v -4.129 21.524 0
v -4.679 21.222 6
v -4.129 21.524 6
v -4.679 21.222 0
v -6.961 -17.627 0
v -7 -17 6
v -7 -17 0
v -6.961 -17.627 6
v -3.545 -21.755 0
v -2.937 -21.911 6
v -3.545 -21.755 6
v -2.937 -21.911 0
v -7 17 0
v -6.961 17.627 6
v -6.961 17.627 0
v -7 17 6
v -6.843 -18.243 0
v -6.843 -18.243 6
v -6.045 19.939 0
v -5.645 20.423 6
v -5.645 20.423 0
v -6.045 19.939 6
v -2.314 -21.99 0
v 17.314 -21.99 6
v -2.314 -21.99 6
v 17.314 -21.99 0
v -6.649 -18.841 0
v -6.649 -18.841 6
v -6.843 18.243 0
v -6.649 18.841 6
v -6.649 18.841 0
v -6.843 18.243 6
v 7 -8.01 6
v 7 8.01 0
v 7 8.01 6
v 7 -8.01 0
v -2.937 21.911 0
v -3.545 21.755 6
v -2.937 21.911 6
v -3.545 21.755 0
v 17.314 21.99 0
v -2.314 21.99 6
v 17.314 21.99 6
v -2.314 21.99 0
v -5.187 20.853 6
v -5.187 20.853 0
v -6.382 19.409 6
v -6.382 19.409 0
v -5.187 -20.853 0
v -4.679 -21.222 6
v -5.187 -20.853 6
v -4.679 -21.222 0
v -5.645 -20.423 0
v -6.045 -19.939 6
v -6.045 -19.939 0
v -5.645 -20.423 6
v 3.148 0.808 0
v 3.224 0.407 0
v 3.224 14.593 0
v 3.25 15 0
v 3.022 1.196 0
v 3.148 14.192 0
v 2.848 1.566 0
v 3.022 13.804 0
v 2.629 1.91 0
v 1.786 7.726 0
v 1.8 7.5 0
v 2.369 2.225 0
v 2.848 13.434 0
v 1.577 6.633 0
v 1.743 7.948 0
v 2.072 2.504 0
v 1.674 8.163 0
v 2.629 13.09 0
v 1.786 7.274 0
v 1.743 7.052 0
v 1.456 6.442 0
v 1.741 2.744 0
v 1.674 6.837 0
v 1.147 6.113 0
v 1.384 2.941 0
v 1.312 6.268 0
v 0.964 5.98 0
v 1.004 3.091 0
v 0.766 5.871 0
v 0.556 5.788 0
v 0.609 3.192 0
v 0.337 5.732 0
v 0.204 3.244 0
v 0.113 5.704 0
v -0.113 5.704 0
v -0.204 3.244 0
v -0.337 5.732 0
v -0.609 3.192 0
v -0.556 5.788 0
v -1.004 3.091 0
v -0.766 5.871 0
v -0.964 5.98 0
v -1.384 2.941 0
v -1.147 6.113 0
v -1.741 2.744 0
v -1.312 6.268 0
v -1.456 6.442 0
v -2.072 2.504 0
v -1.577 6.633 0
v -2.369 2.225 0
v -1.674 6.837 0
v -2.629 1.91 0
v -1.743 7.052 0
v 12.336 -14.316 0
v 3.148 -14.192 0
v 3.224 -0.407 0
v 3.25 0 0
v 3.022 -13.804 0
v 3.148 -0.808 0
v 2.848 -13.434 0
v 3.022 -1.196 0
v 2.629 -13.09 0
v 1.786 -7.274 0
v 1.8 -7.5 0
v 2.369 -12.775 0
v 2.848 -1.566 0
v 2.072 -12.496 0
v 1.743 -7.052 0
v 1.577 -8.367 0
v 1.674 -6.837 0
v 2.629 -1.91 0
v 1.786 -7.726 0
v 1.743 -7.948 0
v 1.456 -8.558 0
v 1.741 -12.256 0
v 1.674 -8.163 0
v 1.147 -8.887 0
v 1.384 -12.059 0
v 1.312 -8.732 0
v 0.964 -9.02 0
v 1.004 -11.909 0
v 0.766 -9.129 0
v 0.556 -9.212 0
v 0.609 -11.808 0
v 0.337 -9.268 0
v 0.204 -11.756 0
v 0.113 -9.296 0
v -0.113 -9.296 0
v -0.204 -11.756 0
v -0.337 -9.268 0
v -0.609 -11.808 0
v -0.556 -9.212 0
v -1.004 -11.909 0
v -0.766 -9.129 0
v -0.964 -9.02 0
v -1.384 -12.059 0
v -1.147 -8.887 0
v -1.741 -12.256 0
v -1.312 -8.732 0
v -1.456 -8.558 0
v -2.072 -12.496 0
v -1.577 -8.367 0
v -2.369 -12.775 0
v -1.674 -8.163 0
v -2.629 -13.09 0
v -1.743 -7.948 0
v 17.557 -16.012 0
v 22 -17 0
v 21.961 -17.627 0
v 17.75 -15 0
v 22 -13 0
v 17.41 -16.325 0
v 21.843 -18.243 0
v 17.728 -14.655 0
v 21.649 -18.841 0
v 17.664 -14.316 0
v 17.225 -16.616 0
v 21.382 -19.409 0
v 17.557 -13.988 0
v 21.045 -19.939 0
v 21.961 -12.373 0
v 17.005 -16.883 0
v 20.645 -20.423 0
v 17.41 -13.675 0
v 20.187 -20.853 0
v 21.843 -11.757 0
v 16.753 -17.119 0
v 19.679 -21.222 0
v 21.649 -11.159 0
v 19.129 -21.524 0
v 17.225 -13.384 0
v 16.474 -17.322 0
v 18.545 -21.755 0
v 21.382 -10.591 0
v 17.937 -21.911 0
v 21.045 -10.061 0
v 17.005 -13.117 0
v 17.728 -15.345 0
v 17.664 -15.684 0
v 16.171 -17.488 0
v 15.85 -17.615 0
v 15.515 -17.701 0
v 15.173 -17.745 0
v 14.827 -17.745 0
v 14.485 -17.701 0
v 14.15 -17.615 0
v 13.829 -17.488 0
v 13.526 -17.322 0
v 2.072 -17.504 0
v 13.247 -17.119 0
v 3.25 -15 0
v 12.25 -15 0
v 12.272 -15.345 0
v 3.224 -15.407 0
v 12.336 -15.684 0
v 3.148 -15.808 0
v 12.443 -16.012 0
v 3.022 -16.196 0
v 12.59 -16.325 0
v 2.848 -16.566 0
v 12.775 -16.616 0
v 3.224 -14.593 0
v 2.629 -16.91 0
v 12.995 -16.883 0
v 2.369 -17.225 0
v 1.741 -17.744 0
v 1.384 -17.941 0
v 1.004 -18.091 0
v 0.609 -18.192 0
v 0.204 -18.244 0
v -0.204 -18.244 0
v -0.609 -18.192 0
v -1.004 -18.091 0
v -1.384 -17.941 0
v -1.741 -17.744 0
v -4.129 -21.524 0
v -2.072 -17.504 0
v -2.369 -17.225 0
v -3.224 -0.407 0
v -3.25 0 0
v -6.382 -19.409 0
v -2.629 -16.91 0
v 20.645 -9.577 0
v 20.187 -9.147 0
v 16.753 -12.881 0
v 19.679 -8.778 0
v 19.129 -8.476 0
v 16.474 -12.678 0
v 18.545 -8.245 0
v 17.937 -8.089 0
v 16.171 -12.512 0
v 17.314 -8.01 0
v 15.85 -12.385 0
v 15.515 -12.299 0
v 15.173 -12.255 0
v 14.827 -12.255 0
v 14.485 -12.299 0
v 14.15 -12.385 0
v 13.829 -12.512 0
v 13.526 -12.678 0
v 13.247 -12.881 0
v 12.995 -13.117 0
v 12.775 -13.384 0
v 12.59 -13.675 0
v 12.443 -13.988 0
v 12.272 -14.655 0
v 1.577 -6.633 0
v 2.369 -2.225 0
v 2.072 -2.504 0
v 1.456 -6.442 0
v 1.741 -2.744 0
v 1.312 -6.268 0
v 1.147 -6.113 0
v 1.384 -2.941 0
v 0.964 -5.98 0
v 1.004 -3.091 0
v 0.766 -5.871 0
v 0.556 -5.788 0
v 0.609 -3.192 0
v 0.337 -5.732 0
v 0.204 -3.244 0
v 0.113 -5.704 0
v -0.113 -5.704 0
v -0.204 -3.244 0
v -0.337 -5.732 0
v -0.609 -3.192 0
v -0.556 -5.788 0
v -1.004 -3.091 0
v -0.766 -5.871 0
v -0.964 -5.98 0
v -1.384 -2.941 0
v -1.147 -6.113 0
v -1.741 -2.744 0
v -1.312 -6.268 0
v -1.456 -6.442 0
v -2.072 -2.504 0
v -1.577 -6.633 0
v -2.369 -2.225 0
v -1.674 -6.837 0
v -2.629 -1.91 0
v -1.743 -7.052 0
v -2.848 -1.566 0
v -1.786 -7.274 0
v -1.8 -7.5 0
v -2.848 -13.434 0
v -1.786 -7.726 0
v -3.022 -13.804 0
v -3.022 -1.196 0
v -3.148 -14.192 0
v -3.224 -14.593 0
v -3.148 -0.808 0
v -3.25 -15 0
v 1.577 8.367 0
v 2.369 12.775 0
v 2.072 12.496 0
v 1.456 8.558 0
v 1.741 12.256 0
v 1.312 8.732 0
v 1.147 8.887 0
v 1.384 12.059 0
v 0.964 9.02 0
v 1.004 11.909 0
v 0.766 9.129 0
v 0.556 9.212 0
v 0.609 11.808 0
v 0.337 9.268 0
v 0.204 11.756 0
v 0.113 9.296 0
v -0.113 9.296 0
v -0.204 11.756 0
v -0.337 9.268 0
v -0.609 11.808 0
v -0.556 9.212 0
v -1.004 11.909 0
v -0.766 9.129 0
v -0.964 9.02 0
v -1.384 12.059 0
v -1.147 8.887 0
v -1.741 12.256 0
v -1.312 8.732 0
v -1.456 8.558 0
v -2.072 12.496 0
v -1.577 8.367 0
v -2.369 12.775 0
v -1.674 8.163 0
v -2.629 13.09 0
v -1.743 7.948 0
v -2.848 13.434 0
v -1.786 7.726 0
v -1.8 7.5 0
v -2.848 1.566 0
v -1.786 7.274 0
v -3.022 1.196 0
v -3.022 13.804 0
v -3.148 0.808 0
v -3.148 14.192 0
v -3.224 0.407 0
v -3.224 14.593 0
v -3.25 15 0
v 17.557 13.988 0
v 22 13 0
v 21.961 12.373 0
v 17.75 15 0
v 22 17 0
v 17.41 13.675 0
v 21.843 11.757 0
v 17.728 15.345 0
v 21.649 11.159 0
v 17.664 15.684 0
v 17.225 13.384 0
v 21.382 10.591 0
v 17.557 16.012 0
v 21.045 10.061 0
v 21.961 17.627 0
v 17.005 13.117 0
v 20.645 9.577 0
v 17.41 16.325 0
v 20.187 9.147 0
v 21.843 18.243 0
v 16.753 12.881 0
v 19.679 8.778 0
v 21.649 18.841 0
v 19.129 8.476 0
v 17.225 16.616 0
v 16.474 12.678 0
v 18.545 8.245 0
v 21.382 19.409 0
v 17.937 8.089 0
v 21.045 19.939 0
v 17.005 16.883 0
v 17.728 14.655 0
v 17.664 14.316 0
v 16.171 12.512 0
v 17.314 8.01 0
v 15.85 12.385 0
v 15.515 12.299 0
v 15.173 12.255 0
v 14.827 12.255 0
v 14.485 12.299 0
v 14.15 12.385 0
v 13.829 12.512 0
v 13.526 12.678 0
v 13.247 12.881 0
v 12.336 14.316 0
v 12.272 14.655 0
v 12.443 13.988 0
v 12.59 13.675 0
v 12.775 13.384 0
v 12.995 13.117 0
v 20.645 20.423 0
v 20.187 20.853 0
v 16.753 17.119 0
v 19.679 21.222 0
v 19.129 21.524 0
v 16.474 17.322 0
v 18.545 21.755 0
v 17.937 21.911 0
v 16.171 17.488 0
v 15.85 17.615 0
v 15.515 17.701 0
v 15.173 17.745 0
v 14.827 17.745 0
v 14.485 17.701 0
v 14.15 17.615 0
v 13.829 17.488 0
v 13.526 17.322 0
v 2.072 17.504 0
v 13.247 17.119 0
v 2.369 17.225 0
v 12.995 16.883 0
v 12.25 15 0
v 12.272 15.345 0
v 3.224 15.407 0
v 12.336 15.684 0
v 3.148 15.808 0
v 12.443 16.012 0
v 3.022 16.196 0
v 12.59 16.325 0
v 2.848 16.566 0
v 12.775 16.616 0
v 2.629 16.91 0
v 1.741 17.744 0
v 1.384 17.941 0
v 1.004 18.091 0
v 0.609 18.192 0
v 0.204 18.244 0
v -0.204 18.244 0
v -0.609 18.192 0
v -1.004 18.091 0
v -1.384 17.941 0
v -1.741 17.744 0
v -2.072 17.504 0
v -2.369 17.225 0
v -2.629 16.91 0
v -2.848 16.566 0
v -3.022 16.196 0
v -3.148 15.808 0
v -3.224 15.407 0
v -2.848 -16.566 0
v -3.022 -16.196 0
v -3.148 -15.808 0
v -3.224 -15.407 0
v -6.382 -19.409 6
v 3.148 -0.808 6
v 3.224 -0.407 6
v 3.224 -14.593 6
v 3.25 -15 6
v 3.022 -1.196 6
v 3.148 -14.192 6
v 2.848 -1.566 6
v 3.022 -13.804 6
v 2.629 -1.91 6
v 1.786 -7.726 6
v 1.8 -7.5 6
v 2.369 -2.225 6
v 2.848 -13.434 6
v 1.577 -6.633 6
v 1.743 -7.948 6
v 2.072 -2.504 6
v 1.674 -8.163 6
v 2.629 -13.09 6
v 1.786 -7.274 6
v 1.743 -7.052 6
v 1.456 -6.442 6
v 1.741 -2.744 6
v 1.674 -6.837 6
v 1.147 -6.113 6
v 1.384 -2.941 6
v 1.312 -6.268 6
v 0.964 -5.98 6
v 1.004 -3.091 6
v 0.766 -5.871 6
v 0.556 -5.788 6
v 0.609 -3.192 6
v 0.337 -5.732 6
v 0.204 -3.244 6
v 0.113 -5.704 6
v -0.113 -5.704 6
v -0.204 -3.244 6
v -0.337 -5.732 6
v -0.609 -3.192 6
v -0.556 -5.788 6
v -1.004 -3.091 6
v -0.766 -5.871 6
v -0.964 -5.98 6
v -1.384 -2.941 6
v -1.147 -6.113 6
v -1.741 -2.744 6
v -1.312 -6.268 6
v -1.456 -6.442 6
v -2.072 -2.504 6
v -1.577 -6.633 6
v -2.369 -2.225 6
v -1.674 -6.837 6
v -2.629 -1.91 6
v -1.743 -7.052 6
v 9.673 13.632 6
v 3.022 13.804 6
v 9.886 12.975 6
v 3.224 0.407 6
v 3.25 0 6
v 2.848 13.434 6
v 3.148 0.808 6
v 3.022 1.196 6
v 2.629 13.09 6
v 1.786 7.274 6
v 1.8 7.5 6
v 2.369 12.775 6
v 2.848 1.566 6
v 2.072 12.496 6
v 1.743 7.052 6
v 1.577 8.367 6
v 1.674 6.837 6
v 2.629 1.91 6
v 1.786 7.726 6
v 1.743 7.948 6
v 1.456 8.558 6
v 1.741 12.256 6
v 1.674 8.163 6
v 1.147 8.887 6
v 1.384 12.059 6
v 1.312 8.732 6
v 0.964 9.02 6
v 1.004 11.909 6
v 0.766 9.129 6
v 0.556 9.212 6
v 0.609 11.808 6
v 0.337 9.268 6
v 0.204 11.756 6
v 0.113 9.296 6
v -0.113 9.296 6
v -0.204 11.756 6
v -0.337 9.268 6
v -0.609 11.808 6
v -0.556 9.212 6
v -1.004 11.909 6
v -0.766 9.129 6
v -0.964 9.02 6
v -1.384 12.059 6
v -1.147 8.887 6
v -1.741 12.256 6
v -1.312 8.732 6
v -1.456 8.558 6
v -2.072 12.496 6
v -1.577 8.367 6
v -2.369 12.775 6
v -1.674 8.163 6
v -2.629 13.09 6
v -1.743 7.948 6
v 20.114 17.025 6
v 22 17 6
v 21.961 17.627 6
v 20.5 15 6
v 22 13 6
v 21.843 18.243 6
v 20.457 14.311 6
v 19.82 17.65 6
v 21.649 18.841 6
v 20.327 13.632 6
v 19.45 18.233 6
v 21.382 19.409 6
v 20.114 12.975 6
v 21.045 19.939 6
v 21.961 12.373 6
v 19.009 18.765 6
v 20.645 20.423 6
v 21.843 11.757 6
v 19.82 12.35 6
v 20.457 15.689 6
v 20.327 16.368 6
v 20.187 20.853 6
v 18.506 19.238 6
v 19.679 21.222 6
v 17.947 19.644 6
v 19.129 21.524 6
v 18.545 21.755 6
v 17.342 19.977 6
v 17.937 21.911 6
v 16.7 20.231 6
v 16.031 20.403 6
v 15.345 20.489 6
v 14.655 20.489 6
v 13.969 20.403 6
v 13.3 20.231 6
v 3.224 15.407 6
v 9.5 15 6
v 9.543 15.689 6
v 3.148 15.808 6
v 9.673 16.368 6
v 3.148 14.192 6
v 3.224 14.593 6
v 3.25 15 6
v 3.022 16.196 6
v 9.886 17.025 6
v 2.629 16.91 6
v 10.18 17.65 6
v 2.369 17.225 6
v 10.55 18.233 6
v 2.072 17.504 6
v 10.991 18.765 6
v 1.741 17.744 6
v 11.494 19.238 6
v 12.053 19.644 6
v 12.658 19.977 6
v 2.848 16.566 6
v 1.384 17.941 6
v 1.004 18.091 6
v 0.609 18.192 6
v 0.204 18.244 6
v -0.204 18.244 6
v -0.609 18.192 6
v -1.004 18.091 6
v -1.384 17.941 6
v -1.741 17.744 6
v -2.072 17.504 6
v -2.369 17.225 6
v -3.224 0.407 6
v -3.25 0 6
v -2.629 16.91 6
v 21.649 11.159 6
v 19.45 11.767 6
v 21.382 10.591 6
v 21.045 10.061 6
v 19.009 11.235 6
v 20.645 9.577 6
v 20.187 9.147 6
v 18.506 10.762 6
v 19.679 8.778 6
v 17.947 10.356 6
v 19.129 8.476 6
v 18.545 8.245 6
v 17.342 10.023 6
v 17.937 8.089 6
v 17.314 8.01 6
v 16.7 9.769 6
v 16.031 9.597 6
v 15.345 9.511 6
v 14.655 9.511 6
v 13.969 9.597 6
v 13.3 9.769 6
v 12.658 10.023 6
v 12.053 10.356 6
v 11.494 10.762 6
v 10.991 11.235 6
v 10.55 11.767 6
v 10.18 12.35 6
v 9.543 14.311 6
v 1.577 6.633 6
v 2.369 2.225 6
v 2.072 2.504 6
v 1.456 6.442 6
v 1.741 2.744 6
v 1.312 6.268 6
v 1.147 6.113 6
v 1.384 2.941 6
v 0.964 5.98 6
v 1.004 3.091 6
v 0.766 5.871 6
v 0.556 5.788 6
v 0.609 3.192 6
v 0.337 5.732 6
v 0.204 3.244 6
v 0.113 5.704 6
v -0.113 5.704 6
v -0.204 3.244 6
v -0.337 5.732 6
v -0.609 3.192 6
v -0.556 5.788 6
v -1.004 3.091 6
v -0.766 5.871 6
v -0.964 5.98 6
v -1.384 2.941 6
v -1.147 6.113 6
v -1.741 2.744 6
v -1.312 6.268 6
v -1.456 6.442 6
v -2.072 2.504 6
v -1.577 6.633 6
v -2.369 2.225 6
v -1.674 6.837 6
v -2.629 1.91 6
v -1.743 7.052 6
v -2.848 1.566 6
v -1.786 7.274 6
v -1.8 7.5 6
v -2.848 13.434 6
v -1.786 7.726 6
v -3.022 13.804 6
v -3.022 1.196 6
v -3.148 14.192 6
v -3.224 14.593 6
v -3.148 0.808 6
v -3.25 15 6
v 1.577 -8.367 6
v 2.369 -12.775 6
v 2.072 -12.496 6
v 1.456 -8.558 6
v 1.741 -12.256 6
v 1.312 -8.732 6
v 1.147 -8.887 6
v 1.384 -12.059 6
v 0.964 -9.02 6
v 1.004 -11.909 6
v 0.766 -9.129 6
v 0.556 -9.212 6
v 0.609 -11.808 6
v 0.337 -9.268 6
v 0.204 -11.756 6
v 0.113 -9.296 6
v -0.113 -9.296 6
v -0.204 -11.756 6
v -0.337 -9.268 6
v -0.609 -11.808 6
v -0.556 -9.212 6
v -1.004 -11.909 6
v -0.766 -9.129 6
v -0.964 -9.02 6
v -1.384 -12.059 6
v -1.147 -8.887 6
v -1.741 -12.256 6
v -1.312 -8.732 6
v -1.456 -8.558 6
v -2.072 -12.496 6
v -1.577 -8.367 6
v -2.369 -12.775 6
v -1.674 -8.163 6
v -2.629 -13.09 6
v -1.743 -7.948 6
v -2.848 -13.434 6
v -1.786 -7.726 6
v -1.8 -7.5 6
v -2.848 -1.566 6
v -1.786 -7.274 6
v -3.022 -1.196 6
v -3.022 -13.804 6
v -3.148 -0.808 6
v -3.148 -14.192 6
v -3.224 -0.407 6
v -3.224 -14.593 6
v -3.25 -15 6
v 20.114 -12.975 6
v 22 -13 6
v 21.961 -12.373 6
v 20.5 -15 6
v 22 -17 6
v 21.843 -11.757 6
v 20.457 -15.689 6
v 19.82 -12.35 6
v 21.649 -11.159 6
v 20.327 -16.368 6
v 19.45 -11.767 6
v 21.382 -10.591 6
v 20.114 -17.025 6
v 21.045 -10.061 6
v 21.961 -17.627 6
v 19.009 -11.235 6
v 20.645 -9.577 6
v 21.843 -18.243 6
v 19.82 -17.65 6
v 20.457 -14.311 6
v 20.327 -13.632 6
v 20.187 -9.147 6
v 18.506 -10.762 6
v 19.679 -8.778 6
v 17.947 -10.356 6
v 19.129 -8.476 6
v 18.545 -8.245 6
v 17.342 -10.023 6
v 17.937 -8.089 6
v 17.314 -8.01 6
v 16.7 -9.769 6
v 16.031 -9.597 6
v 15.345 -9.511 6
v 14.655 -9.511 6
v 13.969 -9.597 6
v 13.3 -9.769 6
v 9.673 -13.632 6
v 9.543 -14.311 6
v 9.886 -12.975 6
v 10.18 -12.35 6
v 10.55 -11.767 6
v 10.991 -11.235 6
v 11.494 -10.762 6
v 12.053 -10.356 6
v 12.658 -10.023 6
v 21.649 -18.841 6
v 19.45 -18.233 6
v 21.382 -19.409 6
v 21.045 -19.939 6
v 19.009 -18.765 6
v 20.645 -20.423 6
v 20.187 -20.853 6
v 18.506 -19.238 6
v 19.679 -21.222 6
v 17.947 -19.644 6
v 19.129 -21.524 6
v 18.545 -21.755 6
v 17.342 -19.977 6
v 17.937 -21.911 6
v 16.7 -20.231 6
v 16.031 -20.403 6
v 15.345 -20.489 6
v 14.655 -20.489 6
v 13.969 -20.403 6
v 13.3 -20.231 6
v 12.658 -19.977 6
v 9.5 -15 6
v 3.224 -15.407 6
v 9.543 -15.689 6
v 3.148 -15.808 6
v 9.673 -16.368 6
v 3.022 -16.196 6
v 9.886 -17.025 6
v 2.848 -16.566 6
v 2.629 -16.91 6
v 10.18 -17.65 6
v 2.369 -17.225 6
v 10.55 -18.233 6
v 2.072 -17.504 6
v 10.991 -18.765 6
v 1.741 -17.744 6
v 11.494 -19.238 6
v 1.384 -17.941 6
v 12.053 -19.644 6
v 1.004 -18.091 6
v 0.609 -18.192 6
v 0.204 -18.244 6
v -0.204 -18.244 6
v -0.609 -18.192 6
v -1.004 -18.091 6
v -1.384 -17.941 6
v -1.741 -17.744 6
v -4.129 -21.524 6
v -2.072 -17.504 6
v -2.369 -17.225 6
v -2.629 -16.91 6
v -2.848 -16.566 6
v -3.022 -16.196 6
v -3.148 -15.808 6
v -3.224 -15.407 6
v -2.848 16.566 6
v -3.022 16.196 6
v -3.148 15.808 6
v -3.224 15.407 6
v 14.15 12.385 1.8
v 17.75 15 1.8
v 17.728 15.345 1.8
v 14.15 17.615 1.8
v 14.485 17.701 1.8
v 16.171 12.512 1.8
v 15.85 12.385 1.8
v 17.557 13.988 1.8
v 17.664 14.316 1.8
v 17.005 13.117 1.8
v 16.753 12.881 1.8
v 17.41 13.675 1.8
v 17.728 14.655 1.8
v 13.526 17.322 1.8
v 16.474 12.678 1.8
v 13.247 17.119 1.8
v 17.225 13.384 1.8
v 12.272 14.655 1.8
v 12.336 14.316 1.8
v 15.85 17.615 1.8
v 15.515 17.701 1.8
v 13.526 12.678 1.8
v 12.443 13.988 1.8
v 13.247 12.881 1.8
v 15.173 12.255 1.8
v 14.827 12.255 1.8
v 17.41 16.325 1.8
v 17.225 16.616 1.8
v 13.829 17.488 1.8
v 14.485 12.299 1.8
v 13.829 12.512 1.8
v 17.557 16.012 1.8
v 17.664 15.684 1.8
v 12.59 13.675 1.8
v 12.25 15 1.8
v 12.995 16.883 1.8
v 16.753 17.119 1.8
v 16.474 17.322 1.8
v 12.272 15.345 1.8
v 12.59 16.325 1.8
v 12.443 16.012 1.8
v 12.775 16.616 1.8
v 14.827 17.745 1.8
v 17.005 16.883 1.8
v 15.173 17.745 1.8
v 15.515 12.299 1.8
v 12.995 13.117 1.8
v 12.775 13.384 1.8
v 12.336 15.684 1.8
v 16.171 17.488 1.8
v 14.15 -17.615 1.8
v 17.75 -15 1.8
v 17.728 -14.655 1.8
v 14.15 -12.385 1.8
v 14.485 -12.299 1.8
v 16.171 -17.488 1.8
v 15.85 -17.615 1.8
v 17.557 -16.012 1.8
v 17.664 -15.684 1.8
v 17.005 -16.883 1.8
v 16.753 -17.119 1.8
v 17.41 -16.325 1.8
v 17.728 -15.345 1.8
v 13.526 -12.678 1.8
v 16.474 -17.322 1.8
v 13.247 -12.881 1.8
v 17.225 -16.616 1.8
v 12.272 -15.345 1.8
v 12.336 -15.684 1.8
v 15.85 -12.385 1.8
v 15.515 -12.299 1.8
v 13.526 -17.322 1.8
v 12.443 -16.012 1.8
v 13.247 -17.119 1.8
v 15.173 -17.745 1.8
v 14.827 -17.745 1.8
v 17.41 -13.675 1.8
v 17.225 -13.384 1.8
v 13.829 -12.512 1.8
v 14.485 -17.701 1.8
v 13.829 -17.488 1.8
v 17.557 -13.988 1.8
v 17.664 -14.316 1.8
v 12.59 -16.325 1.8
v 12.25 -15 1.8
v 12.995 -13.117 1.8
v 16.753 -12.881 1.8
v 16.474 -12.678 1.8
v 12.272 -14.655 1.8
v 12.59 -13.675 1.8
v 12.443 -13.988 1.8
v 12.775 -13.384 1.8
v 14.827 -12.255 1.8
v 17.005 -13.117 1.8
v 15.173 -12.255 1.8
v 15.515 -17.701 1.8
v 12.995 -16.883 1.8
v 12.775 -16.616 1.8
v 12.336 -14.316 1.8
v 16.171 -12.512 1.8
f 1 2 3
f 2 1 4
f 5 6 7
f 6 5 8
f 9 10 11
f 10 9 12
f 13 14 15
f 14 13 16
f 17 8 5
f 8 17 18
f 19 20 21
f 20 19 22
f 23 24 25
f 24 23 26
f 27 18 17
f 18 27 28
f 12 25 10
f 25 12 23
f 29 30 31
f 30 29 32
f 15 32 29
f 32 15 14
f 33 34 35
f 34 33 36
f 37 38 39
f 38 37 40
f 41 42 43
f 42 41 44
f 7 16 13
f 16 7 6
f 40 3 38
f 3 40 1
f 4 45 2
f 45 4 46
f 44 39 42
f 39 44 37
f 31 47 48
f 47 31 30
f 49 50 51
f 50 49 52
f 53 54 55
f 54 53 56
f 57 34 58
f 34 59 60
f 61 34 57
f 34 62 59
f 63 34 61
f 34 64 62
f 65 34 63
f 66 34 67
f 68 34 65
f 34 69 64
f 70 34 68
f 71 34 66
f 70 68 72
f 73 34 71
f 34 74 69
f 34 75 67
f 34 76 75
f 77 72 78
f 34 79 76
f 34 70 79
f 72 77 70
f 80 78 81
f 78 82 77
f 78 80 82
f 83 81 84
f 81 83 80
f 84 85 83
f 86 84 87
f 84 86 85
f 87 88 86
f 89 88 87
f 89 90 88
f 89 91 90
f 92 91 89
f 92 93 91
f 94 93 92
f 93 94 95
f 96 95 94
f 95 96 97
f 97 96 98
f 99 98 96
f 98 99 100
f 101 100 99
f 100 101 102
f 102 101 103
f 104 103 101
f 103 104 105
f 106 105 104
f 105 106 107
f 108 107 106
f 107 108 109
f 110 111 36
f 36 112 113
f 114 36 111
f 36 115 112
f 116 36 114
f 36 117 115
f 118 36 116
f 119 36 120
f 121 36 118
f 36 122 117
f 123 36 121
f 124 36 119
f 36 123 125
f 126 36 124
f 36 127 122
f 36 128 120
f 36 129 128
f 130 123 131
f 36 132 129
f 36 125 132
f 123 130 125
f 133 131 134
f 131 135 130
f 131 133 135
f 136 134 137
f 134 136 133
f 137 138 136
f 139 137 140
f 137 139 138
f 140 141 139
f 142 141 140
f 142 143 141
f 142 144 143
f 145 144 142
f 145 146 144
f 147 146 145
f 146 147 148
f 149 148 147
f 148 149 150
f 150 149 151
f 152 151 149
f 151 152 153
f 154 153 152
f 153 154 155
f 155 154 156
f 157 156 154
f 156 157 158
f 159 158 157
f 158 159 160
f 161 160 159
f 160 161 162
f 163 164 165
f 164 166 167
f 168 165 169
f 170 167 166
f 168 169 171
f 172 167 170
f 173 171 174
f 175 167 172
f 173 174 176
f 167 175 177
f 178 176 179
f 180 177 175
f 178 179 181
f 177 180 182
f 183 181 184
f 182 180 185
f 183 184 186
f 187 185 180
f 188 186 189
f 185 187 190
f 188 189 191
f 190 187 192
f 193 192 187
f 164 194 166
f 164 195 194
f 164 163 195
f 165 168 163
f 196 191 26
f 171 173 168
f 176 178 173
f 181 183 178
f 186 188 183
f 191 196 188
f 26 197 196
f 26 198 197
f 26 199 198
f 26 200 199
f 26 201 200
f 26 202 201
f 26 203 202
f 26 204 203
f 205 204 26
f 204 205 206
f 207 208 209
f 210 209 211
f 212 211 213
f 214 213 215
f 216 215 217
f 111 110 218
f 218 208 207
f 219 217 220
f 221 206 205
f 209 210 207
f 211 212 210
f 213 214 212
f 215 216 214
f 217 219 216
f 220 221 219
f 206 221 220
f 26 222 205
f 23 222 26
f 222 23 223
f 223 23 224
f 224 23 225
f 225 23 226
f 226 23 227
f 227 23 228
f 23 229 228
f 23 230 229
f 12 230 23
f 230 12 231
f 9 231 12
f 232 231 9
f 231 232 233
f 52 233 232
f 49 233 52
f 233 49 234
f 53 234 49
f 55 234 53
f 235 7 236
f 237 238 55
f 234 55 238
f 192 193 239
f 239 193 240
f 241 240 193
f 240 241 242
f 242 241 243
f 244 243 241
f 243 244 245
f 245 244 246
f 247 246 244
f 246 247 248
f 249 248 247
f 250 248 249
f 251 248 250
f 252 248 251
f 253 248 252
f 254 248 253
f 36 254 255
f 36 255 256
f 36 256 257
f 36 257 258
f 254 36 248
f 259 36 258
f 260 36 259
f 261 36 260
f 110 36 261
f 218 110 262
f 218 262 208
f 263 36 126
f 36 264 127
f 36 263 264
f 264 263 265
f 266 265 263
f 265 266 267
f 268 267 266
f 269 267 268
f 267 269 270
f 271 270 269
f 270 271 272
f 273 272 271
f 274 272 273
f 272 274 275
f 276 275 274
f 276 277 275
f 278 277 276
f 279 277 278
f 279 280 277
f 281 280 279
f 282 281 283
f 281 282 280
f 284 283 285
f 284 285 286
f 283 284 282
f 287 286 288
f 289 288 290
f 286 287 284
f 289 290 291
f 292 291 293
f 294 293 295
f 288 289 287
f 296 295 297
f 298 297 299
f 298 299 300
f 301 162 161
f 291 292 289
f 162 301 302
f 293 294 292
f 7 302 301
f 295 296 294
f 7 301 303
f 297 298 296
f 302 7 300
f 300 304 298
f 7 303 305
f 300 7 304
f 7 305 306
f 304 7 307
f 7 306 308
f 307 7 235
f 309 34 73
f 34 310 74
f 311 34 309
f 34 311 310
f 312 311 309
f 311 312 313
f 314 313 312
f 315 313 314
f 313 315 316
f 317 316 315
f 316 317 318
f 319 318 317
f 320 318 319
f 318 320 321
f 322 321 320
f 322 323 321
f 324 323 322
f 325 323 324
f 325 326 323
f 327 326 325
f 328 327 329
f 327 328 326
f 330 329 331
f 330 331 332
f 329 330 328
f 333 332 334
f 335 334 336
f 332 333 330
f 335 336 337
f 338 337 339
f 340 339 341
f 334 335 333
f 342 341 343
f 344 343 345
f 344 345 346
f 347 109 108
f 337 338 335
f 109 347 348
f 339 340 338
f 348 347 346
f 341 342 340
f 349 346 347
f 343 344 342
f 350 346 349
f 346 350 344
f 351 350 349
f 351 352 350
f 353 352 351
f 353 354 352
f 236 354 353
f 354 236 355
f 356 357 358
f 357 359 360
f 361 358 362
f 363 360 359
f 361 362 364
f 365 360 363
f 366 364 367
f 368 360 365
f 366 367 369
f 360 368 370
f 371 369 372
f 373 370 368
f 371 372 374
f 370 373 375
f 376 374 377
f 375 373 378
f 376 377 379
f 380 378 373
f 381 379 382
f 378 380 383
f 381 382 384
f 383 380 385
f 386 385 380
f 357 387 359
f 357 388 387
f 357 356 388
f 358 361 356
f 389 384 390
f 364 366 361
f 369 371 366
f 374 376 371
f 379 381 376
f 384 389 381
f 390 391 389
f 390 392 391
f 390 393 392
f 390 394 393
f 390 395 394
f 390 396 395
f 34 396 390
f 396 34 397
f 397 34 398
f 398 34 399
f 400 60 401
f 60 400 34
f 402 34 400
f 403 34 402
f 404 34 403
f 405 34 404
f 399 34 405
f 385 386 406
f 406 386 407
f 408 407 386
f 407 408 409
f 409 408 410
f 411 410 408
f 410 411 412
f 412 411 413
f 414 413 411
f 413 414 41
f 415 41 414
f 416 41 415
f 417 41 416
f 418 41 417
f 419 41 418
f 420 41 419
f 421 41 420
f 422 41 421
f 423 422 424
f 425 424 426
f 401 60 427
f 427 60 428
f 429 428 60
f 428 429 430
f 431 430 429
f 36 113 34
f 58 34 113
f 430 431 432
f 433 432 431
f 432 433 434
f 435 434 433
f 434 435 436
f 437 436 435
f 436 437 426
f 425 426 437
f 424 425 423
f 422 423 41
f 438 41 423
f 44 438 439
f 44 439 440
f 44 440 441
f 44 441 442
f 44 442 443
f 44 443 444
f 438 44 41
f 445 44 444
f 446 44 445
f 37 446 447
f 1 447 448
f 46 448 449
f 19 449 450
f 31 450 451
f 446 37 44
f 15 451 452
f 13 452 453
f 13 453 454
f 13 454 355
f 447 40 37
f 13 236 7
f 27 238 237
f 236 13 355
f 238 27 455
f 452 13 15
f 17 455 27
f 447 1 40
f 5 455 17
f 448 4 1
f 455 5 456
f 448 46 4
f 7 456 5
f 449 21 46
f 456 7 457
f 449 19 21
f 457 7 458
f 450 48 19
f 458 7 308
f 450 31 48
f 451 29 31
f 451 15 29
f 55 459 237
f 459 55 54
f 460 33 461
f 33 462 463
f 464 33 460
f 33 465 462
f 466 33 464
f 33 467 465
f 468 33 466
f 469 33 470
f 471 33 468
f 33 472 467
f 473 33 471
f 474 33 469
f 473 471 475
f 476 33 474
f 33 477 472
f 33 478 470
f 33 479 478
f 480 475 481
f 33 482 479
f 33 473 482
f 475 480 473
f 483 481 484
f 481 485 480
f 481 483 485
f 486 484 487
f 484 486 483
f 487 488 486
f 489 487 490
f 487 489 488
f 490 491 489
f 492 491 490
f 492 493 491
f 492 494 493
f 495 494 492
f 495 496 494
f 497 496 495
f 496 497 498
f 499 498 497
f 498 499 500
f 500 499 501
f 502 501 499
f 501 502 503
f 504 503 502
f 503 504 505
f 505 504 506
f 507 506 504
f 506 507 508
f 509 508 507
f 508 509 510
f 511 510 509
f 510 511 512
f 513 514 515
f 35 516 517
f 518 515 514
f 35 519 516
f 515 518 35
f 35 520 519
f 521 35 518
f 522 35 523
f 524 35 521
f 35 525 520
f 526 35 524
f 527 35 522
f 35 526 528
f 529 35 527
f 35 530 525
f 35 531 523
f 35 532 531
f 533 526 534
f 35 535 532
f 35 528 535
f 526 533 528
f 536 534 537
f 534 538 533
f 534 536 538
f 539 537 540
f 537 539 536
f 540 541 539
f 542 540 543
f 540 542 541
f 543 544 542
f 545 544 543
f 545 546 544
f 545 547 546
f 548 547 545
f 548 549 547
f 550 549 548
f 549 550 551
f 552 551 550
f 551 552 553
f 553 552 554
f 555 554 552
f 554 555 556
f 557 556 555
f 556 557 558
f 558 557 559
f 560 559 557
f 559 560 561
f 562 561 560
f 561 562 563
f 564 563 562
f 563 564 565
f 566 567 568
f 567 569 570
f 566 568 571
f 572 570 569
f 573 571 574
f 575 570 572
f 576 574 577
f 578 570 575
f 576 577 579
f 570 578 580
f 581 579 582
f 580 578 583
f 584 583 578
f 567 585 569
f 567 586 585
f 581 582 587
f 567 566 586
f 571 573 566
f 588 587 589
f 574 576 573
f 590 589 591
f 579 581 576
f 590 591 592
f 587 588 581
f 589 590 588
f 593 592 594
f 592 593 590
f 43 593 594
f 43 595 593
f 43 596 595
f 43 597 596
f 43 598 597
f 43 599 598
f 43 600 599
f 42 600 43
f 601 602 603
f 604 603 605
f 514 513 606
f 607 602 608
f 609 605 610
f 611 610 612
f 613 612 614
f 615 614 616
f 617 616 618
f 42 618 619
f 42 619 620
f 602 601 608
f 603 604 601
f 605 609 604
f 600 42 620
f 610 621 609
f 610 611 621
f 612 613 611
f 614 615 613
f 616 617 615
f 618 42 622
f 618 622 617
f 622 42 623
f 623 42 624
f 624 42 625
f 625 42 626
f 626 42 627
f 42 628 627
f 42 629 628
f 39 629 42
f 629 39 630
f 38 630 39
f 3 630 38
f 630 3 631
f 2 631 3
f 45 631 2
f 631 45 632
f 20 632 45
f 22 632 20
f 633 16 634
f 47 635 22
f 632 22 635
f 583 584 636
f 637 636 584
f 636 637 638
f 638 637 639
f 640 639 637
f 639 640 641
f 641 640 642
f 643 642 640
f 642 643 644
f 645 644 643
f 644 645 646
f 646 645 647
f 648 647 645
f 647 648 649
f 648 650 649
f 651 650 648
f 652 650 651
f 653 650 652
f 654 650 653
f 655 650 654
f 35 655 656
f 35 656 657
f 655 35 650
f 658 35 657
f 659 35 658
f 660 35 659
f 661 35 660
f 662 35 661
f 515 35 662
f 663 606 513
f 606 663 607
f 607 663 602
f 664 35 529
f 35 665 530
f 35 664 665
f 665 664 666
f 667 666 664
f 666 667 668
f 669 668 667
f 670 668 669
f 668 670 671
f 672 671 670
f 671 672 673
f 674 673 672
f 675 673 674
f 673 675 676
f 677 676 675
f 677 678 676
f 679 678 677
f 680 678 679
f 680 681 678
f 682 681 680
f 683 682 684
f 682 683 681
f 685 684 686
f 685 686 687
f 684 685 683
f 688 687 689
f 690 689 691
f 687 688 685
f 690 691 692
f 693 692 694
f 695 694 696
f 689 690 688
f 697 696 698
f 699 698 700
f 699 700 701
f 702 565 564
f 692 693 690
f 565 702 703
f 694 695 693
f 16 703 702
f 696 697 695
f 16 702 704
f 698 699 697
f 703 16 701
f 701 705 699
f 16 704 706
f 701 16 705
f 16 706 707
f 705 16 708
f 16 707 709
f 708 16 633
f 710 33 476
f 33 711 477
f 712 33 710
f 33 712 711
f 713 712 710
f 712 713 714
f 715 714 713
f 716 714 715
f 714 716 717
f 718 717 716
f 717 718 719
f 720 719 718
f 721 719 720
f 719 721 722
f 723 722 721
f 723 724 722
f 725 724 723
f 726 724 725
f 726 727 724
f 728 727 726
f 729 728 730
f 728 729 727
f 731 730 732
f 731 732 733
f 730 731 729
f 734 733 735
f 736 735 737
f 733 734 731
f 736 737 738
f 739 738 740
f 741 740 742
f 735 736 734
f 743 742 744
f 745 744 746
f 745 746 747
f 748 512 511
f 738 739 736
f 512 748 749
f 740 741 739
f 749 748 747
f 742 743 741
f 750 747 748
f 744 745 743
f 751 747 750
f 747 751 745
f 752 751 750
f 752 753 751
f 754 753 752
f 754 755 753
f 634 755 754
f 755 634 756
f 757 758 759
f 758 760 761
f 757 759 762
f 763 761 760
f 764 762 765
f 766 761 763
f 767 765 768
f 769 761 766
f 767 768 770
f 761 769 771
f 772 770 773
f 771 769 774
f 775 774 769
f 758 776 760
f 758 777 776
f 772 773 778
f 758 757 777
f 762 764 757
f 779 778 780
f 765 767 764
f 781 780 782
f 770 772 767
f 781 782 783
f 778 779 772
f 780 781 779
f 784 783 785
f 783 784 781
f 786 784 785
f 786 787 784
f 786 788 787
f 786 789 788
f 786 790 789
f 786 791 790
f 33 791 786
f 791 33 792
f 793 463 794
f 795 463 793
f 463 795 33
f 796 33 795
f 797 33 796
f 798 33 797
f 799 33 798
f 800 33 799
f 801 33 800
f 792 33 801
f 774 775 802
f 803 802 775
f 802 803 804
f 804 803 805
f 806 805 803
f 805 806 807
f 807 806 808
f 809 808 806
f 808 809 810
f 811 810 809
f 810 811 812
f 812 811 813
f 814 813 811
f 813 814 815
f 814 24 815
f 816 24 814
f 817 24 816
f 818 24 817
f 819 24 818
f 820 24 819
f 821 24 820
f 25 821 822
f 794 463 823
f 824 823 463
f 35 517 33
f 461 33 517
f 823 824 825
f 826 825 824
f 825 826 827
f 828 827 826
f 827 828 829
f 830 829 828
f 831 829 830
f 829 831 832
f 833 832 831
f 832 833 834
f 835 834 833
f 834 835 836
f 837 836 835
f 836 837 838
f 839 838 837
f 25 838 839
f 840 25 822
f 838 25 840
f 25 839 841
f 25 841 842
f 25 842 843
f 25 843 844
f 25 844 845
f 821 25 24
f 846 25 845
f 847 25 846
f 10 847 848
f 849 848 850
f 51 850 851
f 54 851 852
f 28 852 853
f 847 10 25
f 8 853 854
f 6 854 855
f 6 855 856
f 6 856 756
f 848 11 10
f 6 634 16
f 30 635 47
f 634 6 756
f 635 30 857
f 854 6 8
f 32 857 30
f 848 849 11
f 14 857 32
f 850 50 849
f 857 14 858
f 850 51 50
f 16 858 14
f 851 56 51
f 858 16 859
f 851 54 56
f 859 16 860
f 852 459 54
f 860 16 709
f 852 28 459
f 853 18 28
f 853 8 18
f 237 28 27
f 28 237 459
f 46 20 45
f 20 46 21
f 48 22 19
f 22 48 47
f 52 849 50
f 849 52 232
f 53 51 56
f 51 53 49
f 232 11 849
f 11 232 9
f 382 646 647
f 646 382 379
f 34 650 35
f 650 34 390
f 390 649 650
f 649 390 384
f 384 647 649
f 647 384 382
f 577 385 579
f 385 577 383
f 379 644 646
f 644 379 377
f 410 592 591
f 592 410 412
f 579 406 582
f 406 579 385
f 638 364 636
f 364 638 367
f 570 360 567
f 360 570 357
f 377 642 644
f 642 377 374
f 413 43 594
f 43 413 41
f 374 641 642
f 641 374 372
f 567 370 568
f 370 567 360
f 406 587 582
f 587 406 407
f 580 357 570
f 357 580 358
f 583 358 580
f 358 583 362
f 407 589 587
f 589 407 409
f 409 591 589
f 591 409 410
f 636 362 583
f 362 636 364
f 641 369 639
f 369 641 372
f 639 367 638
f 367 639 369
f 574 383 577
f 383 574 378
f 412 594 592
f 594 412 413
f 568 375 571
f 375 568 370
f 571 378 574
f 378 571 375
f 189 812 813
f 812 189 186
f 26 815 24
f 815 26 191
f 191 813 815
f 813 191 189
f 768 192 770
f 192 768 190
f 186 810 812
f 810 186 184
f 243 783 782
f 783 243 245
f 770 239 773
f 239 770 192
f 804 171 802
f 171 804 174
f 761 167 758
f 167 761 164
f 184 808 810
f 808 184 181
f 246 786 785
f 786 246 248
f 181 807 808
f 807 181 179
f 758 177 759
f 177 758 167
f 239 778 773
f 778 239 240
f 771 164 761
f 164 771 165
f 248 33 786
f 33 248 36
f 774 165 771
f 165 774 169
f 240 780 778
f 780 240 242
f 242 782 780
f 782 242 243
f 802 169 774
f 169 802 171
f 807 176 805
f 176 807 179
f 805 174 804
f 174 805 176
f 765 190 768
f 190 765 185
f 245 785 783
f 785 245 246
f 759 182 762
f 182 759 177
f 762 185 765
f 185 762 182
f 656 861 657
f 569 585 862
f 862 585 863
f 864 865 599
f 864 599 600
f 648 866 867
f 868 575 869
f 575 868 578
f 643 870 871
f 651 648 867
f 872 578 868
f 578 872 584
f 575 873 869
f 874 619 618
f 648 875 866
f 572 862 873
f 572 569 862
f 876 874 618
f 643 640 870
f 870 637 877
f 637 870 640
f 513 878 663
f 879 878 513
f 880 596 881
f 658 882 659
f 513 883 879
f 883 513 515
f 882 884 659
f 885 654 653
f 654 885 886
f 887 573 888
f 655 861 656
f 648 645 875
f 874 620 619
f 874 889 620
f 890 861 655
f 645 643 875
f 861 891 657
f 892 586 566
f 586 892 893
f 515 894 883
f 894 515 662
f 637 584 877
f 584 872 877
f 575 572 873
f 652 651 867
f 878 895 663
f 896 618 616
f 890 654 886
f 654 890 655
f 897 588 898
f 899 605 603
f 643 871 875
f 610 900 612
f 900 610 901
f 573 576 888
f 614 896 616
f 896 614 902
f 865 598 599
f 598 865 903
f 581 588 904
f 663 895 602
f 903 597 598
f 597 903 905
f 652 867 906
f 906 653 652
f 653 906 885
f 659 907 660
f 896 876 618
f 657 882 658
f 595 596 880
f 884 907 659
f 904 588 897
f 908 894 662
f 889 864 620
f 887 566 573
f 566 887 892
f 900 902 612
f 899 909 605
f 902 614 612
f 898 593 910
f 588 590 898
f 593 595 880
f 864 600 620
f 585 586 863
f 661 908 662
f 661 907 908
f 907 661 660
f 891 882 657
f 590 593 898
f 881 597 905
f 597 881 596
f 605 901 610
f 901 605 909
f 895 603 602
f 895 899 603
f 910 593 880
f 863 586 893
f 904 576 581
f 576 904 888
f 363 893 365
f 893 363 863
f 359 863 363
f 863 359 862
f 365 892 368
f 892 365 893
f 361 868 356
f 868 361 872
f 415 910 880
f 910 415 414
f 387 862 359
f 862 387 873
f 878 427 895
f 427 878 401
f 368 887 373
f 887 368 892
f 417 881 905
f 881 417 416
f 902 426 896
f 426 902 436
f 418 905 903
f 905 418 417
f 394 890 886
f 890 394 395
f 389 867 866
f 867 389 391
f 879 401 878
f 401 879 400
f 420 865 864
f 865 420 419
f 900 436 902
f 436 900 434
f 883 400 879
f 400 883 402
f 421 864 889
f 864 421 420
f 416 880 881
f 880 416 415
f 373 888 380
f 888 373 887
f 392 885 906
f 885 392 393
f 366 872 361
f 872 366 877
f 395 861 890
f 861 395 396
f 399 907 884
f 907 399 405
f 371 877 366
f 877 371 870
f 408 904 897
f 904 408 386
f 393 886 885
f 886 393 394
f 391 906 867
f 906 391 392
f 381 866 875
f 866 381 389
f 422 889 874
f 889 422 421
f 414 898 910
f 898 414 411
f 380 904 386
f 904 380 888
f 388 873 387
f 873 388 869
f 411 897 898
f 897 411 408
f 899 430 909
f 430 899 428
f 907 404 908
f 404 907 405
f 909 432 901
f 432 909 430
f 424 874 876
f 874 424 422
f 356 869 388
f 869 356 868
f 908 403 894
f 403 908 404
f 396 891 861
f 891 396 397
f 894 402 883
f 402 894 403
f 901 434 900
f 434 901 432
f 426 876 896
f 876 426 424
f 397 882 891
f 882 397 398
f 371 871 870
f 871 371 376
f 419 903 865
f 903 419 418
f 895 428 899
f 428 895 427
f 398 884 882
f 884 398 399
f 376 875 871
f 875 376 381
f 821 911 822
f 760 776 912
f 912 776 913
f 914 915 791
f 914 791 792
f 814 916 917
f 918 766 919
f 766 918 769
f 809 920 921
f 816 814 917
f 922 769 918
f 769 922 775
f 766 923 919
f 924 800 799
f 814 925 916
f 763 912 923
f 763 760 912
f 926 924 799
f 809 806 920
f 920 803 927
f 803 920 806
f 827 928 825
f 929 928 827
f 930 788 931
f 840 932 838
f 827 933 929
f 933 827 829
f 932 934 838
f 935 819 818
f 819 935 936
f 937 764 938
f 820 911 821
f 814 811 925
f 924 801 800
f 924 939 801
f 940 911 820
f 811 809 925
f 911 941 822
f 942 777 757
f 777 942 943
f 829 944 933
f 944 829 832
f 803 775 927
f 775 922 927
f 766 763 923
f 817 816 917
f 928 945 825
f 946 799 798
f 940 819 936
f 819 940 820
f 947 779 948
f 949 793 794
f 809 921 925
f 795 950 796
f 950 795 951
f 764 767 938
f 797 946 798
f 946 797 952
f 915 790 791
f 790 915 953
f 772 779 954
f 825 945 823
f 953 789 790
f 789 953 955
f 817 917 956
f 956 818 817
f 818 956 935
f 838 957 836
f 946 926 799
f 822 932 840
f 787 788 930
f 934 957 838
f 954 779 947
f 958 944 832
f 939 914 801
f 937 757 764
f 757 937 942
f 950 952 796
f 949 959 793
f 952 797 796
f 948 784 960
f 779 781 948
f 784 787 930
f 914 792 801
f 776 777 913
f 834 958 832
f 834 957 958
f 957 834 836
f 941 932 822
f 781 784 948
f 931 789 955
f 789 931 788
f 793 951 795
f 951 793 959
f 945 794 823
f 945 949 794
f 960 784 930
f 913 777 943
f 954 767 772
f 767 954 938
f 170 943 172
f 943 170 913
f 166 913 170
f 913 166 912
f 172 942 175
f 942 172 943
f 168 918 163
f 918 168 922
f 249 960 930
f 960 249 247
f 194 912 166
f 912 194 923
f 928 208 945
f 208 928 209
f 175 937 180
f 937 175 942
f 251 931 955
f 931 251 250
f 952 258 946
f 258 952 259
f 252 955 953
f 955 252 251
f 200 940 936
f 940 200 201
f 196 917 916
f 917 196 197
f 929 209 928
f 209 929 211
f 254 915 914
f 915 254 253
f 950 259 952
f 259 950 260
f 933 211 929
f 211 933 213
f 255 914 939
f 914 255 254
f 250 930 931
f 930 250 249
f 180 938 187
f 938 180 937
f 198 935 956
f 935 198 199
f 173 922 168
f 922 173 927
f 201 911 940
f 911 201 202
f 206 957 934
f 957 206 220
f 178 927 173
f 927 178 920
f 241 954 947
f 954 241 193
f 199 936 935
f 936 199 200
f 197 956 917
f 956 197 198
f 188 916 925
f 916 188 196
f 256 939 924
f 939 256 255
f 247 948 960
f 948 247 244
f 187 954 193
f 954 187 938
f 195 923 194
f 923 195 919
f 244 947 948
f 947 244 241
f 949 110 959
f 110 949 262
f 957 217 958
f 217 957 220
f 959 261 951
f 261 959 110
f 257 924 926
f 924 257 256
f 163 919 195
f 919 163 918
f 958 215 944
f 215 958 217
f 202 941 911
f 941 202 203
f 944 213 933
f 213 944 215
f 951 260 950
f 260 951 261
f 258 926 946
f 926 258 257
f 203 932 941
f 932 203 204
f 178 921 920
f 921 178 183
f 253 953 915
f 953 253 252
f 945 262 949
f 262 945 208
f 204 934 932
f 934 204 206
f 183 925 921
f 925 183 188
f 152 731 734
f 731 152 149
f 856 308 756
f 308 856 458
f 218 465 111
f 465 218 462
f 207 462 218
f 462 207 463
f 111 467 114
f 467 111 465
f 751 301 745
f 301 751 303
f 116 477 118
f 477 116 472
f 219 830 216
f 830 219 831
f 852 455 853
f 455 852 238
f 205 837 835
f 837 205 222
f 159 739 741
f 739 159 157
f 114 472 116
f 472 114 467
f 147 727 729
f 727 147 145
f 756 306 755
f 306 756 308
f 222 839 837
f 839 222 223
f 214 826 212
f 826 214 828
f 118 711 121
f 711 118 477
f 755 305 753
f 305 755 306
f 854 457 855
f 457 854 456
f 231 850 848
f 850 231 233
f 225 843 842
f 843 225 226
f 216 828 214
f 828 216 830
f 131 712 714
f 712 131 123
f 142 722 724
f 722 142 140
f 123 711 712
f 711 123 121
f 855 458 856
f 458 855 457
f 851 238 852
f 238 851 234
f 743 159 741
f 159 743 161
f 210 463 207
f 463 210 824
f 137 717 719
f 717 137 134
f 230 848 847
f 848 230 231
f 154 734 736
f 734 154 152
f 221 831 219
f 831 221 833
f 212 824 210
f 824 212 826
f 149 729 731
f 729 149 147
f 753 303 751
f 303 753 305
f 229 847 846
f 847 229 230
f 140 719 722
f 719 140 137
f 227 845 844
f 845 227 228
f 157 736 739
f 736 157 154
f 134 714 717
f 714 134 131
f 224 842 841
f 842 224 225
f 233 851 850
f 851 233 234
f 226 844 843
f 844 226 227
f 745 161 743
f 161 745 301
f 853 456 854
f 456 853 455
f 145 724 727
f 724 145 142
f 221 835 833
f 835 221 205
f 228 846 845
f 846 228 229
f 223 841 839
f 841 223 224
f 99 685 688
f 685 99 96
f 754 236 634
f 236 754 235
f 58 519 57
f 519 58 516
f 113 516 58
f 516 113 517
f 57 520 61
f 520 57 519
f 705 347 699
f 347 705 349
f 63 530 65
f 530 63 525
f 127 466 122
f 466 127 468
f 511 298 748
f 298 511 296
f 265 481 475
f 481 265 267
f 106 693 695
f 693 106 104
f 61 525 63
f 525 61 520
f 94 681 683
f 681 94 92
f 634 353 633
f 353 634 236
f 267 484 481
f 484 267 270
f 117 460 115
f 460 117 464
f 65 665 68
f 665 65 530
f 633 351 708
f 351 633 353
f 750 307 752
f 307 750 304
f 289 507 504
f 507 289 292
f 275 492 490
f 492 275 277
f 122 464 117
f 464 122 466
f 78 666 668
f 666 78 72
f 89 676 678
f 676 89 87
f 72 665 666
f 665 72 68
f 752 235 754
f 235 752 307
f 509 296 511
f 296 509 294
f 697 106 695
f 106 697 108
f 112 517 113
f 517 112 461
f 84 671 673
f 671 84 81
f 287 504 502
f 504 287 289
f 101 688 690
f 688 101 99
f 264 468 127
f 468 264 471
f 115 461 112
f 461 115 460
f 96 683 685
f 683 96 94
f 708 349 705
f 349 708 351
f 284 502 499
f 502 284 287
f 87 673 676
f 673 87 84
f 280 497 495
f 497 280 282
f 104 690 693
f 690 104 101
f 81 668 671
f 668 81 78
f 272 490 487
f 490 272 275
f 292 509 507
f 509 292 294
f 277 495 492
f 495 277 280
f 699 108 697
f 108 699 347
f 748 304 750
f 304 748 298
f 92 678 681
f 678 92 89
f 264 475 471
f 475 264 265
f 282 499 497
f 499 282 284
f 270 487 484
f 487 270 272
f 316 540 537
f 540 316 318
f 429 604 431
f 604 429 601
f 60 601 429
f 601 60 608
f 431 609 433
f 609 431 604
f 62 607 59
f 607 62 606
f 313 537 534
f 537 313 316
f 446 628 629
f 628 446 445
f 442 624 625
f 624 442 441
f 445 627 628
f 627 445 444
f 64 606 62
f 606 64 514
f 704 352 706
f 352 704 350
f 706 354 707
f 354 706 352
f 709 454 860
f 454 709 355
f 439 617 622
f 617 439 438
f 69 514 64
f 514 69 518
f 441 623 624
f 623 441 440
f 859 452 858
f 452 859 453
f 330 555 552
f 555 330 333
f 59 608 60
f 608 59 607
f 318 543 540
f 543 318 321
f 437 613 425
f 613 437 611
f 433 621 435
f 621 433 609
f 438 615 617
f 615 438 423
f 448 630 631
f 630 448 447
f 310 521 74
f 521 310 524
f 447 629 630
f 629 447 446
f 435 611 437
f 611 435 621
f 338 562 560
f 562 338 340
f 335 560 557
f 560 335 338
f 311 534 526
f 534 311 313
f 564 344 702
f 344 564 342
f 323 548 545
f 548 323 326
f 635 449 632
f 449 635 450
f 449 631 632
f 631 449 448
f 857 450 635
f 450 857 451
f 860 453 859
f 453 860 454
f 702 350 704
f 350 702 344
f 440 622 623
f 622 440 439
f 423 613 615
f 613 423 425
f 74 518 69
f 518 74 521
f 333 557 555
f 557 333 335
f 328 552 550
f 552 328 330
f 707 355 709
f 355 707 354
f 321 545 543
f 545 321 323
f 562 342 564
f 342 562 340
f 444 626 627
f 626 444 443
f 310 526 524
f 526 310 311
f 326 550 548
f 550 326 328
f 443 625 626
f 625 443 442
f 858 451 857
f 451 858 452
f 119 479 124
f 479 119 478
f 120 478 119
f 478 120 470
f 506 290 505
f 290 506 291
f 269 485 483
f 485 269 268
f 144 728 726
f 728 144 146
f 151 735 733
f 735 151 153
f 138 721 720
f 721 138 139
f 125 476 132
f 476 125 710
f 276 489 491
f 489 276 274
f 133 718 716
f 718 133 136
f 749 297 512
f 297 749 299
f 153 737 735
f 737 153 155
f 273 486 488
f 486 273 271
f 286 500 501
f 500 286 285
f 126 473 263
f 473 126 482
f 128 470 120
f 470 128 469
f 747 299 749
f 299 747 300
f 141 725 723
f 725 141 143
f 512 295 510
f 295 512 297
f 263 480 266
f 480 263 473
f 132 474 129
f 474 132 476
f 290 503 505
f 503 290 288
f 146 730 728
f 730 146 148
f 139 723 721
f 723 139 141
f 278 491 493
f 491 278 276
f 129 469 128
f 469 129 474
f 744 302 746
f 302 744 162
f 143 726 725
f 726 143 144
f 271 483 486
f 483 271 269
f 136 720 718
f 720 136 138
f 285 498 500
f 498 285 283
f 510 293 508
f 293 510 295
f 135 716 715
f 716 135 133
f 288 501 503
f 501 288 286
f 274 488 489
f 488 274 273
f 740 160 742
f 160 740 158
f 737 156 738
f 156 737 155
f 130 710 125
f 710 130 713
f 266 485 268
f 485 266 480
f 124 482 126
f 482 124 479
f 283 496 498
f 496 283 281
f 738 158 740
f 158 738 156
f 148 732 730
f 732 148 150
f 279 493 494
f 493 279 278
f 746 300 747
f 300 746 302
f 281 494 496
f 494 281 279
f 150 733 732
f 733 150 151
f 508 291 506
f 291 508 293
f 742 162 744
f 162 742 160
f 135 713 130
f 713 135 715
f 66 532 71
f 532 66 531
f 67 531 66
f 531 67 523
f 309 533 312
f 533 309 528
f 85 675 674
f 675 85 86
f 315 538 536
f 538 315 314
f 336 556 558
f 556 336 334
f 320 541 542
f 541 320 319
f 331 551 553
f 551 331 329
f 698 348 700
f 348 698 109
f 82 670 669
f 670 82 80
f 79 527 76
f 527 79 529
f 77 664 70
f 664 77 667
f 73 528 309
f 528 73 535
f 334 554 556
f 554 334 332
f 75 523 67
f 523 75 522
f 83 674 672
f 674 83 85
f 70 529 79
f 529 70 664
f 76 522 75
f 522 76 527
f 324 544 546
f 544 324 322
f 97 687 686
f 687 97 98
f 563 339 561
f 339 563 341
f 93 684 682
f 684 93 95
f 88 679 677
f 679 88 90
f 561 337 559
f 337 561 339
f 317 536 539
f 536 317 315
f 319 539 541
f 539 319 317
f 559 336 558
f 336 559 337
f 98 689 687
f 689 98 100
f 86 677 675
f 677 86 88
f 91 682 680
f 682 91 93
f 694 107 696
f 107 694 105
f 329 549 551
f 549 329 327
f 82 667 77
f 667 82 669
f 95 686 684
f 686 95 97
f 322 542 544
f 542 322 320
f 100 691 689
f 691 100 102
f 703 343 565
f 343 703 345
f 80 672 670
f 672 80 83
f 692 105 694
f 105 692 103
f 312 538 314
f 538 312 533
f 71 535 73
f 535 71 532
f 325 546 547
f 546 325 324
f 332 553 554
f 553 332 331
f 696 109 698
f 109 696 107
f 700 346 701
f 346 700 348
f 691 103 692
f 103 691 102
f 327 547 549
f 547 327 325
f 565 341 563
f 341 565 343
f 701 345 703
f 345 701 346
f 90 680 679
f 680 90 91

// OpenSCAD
$fn = 50;


difference() {
	union() {
		hull() {
			translate(v = [-2.0000000000, 17.0000000000, 0]) {
				cylinder(h = 6, r = 5);
			}
			translate(v = [2.0000000000, 17.0000000000, 0]) {
				cylinder(h = 6, r = 5);
			}
			translate(v = [-2.0000000000, -17.0000000000, 0]) {
				cylinder(h = 6, r = 5);
			}
			translate(v = [2.0000000000, -17.0000000000, 0]) {
				cylinder(h = 6, r = 5);
			}
		}
		translate(v = [7.5000000000, 15.0000000000, 0]) {
			hull() {
				translate(v = [-9.5000000000, 2.0000000000, 0]) {
					cylinder(h = 6, r = 5);
				}
				translate(v = [9.5000000000, 2.0000000000, 0]) {
					cylinder(h = 6, r = 5);
				}
				translate(v = [-9.5000000000, -2.0000000000, 0]) {
					cylinder(h = 6, r = 5);
				}
				translate(v = [9.5000000000, -2.0000000000, 0]) {
					cylinder(h = 6, r = 5);
				}
			}
		}
		translate(v = [7.5000000000, -15.0000000000, 0]) {
			hull() {
				translate(v = [-9.5000000000, 2.0000000000, 0]) {
					cylinder(h = 6, r = 5);
				}
				translate(v = [9.5000000000, 2.0000000000, 0]) {
					cylinder(h = 6, r = 5);
				}
				translate(v = [-9.5000000000, -2.0000000000, 0]) {
					cylinder(h = 6, r = 5);
				}
				translate(v = [9.5000000000, -2.0000000000, 0]) {
					cylinder(h = 6, r = 5);
				}
			}
		}
	}
	union() {
		translate(v = [15.0000000000, 15.0000000000, 6]) {
			rotate(a = [0, 0, 0]) {
				difference() {
					union() {
						#translate(v = [0, 0, -6.0000000000]) {
							cylinder(h = 6, r = 2.2500000000);
						}
						#translate(v = [0, 0, -4.2000000000]) {
							cylinder(h = 4.2000000000, r1 = 2.7500000000, r2 = 5.5000000000);
						}
						#translate(v = [0, 0, -6.0000000000]) {
							cylinder(h = 6, r = 2.7500000000);
						}
						#translate(v = [0, 0, -6.0000000000]) {
							cylinder(h = 6, r = 2.2500000000);
						}
					}
					union();
				}
			}
		}
		translate(v = [15.0000000000, -15.0000000000, 6]) {
			rotate(a = [0, 0, 0]) {
				difference() {
					union() {
						#translate(v = [0, 0, -6.0000000000]) {
							cylinder(h = 6, r = 2.2500000000);
						}
						#translate(v = [0, 0, -4.2000000000]) {
							cylinder(h = 4.2000000000, r1 = 2.7500000000, r2 = 5.5000000000);
						}
						#translate(v = [0, 0, -6.0000000000]) {
							cylinder(h = 6, r = 2.7500000000);
						}
						#translate(v = [0, 0, -6.0000000000]) {
							cylinder(h = 6, r = 2.2500000000);
						}
					}
					union();
				}
			}
		}
		translate(v = [0.0000000000, -15.0000000000, 0]) {
			translate(v = [0, 0, -100]) {
				cylinder(h = 200, r = 3.2500000000);
			}
		}
		translate(v = [0, 0, -100]) {
			cylinder(h = 200, r = 3.2500000000);
		}
		translate(v = [0.0000000000, 15.0000000000, 0]) {
			translate(v = [0, 0, -100]) {
				cylinder(h = 200, r = 3.2500000000);
			}
		}
		translate(v = [0.0000000000, -15.0000000000, 0]) {
			translate(v = [0, 0, -100]) {
				cylinder(h = 200, r = 1.8000000000);
			}
		}
		translate(v = [0.0000000000, -7.5000000000, 0]) {
			translate(v = [0, 0, -100]) {
				cylinder(h = 200, r = 1.8000000000);
			}
		}
		translate(v = [0, 0, -100]) {
			cylinder(h = 200, r = 1.8000000000);
		}
		translate(v = [0.0000000000, 7.5000000000, 0]) {
			translate(v = [0, 0, -100]) {
				cylinder(h = 200, r = 1.8000000000);
			}
		}
		translate(v = [0.0000000000, 15.0000000000, 0]) {
			translate(v = [0, 0, -100]) {
				cylinder(h = 200, r = 1.8000000000);
			}
		}
	}
}
